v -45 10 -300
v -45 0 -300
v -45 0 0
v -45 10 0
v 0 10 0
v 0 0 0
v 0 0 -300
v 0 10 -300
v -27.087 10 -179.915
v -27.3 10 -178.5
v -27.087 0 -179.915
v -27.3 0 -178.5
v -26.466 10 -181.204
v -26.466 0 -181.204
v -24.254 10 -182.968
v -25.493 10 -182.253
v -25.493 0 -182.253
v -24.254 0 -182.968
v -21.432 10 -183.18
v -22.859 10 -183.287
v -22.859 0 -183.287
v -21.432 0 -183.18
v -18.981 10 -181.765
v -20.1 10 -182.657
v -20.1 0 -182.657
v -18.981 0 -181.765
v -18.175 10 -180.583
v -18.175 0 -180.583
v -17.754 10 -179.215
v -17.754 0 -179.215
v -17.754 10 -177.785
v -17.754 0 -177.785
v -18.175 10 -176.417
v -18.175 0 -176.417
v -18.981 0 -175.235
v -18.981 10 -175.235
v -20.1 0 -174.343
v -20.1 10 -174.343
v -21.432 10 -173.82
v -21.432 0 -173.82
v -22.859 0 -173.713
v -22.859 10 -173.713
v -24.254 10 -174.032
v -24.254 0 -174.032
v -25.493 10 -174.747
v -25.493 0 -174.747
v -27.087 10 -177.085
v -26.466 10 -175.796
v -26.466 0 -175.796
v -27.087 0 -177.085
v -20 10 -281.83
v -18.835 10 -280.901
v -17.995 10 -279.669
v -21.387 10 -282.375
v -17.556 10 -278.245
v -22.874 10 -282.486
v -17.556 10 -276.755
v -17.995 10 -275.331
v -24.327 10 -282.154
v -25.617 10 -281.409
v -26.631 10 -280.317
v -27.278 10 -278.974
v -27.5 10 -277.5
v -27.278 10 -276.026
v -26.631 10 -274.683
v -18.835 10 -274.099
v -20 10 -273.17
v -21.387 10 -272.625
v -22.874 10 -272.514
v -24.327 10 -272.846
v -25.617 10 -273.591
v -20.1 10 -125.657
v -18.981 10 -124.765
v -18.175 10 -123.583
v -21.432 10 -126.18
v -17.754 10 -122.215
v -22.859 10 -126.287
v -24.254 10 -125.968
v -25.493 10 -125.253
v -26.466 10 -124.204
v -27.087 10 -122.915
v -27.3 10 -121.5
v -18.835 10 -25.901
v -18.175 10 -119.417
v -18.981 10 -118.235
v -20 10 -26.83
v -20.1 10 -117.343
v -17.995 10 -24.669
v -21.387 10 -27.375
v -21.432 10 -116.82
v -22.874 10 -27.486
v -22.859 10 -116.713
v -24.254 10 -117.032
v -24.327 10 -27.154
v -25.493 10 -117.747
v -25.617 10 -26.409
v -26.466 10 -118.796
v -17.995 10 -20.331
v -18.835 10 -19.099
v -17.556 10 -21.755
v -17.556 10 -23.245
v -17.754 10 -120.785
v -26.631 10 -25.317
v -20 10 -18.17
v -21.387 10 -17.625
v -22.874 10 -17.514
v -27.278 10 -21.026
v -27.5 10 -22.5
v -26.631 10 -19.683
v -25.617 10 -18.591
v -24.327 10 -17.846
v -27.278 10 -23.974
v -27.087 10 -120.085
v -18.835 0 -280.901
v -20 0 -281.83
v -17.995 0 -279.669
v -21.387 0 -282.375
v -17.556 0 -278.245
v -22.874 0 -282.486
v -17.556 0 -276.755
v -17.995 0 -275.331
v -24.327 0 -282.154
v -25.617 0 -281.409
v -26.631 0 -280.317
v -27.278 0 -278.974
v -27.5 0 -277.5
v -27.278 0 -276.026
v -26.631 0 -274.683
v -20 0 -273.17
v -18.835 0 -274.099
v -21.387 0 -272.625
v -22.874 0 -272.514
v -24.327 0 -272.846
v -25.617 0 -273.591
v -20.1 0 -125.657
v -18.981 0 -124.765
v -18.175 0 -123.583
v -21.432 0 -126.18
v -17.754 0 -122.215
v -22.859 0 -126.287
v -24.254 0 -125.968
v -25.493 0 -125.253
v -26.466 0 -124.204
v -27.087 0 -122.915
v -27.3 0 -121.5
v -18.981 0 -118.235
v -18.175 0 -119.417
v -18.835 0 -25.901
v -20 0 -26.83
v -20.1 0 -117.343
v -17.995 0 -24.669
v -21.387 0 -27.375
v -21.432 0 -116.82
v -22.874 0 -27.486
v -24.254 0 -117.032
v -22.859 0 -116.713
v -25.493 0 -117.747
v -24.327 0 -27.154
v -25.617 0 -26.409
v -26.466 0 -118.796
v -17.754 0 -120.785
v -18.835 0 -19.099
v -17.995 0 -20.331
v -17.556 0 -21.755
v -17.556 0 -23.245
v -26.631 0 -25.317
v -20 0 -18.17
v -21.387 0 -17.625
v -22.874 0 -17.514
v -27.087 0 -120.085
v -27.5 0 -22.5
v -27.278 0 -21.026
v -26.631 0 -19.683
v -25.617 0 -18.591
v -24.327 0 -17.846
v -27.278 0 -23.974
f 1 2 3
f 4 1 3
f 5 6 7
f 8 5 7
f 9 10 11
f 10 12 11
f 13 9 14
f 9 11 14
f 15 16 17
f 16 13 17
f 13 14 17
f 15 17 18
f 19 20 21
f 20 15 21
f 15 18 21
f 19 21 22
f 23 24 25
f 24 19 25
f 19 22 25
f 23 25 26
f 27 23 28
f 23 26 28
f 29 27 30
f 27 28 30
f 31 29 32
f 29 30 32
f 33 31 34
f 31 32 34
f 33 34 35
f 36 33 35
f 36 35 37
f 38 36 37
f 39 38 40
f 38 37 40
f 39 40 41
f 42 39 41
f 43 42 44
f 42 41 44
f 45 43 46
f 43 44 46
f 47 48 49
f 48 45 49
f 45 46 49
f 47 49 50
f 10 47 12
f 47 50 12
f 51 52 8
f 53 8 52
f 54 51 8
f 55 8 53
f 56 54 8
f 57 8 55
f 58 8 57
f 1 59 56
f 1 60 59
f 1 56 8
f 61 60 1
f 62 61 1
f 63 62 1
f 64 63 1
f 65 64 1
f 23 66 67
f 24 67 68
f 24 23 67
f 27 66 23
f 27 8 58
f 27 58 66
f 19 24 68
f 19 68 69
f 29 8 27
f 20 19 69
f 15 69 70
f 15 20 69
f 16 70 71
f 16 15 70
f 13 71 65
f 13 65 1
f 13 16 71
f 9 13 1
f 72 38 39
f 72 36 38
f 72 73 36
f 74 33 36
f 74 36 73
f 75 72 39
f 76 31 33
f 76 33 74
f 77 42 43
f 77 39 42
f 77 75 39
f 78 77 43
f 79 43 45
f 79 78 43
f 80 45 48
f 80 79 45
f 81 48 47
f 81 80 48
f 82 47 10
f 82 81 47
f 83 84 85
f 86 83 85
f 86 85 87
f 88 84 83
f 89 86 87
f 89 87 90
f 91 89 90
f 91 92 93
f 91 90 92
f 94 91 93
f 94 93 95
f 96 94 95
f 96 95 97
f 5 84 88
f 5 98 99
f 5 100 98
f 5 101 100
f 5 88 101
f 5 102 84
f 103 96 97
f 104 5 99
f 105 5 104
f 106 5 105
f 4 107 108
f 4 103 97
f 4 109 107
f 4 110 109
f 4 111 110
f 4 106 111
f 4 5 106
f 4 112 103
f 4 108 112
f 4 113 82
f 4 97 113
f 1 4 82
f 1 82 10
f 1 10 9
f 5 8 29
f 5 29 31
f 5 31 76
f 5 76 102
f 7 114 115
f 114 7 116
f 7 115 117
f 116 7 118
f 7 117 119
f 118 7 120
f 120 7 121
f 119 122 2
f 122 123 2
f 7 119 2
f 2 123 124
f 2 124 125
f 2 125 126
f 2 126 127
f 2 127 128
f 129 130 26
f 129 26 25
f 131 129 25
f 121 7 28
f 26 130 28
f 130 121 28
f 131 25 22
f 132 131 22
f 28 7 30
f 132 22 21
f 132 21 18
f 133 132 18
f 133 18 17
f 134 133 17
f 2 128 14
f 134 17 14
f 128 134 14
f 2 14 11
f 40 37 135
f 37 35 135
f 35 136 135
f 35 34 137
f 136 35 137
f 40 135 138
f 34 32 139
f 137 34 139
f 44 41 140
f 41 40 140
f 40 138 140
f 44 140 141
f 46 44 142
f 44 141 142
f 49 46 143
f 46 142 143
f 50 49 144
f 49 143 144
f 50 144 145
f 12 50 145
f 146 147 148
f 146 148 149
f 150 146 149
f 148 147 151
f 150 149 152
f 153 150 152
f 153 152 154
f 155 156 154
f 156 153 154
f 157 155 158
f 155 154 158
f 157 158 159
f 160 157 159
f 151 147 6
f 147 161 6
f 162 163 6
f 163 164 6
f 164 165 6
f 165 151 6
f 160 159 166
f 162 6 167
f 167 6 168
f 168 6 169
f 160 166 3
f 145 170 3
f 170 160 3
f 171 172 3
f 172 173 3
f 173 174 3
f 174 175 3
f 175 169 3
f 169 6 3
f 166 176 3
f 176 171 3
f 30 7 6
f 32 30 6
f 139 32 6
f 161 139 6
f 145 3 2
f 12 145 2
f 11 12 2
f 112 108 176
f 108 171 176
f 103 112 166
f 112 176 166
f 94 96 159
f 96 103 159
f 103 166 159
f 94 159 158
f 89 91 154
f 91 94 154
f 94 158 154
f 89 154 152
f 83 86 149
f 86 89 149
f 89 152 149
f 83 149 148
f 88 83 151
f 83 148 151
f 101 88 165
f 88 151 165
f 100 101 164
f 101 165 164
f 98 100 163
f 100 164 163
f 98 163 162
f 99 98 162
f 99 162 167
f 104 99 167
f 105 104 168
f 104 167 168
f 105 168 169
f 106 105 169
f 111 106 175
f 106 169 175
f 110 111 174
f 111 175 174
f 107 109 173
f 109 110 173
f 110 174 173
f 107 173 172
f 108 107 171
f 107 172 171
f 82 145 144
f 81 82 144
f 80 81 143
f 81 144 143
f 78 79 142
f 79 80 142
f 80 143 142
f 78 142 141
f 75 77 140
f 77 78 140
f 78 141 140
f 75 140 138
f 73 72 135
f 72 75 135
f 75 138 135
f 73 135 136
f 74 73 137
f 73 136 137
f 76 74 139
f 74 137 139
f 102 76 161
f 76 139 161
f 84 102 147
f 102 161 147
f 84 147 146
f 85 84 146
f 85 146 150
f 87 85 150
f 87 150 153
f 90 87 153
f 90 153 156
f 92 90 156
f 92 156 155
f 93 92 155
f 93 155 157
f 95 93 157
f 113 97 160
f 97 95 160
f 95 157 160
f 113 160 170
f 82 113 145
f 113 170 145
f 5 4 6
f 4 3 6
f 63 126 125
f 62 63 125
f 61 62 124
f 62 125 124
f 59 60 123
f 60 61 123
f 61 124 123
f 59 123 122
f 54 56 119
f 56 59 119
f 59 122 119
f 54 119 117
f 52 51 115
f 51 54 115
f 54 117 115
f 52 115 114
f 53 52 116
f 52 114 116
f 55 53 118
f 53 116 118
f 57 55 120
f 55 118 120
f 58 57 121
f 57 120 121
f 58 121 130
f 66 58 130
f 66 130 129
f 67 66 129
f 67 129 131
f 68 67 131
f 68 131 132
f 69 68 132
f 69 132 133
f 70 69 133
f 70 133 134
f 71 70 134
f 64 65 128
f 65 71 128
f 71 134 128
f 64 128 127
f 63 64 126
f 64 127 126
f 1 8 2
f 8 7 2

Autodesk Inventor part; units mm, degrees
ref_plane "YZ Plane" through (0, 0, 0) normal (1, 0, 0) x (0, 1, 0)
ref_plane "XZ Plane" through (0, 0, 0) normal (0, 1, 0) x (-1, 0, 0)
ref_plane "XY Plane" through (0, 0, 0) normal (0, 0, 1) x (1, 0, 0)
sketch "Sketch1" plane through (0, 0, 0) normal (0, 1, 0) x (-1, 0, 0)
  line L0 (45, 0) -> (0, 0)
  line L1 (0, 0) -> (0, -300)
  line L2 (0, -300) -> (45, -300)
  line L3 (45, -300) -> (45, 0)
  circle A0 centre (22.5, -22.5) radius 5
  circle A1 centre (22.5, -277.5) radius 5
  line L4 (79.2183, -150) -> (-46.459, -150) construction
  circle A2 centre (22.5, -121.5) radius 4.8
  circle A3 centre (22.5, -178.5) radius 4.8
  dimension "d0" = 300
  dimension "d1" = 45
  dimension "d2" = 10
  dimension "d3" = 10
  dimension "d4" = 22.5
  dimension "d5" = 22.5
  dimension "d6" = 22.5
  dimension "d7" = 22.5
  dimension "d8" = 150
  dimension "d9" = 9.6
  dimension "d10" = 28.5
  dimension "d11" = 22.5
  dimension "d12" = 22.5
  dimension "d13" = 28.5
extrude "Extrusion1" add sketch "Sketch1" along normal blind 10
properties part number "1211_Distal Roller Plate_V1" material "Wood (Birch)"
